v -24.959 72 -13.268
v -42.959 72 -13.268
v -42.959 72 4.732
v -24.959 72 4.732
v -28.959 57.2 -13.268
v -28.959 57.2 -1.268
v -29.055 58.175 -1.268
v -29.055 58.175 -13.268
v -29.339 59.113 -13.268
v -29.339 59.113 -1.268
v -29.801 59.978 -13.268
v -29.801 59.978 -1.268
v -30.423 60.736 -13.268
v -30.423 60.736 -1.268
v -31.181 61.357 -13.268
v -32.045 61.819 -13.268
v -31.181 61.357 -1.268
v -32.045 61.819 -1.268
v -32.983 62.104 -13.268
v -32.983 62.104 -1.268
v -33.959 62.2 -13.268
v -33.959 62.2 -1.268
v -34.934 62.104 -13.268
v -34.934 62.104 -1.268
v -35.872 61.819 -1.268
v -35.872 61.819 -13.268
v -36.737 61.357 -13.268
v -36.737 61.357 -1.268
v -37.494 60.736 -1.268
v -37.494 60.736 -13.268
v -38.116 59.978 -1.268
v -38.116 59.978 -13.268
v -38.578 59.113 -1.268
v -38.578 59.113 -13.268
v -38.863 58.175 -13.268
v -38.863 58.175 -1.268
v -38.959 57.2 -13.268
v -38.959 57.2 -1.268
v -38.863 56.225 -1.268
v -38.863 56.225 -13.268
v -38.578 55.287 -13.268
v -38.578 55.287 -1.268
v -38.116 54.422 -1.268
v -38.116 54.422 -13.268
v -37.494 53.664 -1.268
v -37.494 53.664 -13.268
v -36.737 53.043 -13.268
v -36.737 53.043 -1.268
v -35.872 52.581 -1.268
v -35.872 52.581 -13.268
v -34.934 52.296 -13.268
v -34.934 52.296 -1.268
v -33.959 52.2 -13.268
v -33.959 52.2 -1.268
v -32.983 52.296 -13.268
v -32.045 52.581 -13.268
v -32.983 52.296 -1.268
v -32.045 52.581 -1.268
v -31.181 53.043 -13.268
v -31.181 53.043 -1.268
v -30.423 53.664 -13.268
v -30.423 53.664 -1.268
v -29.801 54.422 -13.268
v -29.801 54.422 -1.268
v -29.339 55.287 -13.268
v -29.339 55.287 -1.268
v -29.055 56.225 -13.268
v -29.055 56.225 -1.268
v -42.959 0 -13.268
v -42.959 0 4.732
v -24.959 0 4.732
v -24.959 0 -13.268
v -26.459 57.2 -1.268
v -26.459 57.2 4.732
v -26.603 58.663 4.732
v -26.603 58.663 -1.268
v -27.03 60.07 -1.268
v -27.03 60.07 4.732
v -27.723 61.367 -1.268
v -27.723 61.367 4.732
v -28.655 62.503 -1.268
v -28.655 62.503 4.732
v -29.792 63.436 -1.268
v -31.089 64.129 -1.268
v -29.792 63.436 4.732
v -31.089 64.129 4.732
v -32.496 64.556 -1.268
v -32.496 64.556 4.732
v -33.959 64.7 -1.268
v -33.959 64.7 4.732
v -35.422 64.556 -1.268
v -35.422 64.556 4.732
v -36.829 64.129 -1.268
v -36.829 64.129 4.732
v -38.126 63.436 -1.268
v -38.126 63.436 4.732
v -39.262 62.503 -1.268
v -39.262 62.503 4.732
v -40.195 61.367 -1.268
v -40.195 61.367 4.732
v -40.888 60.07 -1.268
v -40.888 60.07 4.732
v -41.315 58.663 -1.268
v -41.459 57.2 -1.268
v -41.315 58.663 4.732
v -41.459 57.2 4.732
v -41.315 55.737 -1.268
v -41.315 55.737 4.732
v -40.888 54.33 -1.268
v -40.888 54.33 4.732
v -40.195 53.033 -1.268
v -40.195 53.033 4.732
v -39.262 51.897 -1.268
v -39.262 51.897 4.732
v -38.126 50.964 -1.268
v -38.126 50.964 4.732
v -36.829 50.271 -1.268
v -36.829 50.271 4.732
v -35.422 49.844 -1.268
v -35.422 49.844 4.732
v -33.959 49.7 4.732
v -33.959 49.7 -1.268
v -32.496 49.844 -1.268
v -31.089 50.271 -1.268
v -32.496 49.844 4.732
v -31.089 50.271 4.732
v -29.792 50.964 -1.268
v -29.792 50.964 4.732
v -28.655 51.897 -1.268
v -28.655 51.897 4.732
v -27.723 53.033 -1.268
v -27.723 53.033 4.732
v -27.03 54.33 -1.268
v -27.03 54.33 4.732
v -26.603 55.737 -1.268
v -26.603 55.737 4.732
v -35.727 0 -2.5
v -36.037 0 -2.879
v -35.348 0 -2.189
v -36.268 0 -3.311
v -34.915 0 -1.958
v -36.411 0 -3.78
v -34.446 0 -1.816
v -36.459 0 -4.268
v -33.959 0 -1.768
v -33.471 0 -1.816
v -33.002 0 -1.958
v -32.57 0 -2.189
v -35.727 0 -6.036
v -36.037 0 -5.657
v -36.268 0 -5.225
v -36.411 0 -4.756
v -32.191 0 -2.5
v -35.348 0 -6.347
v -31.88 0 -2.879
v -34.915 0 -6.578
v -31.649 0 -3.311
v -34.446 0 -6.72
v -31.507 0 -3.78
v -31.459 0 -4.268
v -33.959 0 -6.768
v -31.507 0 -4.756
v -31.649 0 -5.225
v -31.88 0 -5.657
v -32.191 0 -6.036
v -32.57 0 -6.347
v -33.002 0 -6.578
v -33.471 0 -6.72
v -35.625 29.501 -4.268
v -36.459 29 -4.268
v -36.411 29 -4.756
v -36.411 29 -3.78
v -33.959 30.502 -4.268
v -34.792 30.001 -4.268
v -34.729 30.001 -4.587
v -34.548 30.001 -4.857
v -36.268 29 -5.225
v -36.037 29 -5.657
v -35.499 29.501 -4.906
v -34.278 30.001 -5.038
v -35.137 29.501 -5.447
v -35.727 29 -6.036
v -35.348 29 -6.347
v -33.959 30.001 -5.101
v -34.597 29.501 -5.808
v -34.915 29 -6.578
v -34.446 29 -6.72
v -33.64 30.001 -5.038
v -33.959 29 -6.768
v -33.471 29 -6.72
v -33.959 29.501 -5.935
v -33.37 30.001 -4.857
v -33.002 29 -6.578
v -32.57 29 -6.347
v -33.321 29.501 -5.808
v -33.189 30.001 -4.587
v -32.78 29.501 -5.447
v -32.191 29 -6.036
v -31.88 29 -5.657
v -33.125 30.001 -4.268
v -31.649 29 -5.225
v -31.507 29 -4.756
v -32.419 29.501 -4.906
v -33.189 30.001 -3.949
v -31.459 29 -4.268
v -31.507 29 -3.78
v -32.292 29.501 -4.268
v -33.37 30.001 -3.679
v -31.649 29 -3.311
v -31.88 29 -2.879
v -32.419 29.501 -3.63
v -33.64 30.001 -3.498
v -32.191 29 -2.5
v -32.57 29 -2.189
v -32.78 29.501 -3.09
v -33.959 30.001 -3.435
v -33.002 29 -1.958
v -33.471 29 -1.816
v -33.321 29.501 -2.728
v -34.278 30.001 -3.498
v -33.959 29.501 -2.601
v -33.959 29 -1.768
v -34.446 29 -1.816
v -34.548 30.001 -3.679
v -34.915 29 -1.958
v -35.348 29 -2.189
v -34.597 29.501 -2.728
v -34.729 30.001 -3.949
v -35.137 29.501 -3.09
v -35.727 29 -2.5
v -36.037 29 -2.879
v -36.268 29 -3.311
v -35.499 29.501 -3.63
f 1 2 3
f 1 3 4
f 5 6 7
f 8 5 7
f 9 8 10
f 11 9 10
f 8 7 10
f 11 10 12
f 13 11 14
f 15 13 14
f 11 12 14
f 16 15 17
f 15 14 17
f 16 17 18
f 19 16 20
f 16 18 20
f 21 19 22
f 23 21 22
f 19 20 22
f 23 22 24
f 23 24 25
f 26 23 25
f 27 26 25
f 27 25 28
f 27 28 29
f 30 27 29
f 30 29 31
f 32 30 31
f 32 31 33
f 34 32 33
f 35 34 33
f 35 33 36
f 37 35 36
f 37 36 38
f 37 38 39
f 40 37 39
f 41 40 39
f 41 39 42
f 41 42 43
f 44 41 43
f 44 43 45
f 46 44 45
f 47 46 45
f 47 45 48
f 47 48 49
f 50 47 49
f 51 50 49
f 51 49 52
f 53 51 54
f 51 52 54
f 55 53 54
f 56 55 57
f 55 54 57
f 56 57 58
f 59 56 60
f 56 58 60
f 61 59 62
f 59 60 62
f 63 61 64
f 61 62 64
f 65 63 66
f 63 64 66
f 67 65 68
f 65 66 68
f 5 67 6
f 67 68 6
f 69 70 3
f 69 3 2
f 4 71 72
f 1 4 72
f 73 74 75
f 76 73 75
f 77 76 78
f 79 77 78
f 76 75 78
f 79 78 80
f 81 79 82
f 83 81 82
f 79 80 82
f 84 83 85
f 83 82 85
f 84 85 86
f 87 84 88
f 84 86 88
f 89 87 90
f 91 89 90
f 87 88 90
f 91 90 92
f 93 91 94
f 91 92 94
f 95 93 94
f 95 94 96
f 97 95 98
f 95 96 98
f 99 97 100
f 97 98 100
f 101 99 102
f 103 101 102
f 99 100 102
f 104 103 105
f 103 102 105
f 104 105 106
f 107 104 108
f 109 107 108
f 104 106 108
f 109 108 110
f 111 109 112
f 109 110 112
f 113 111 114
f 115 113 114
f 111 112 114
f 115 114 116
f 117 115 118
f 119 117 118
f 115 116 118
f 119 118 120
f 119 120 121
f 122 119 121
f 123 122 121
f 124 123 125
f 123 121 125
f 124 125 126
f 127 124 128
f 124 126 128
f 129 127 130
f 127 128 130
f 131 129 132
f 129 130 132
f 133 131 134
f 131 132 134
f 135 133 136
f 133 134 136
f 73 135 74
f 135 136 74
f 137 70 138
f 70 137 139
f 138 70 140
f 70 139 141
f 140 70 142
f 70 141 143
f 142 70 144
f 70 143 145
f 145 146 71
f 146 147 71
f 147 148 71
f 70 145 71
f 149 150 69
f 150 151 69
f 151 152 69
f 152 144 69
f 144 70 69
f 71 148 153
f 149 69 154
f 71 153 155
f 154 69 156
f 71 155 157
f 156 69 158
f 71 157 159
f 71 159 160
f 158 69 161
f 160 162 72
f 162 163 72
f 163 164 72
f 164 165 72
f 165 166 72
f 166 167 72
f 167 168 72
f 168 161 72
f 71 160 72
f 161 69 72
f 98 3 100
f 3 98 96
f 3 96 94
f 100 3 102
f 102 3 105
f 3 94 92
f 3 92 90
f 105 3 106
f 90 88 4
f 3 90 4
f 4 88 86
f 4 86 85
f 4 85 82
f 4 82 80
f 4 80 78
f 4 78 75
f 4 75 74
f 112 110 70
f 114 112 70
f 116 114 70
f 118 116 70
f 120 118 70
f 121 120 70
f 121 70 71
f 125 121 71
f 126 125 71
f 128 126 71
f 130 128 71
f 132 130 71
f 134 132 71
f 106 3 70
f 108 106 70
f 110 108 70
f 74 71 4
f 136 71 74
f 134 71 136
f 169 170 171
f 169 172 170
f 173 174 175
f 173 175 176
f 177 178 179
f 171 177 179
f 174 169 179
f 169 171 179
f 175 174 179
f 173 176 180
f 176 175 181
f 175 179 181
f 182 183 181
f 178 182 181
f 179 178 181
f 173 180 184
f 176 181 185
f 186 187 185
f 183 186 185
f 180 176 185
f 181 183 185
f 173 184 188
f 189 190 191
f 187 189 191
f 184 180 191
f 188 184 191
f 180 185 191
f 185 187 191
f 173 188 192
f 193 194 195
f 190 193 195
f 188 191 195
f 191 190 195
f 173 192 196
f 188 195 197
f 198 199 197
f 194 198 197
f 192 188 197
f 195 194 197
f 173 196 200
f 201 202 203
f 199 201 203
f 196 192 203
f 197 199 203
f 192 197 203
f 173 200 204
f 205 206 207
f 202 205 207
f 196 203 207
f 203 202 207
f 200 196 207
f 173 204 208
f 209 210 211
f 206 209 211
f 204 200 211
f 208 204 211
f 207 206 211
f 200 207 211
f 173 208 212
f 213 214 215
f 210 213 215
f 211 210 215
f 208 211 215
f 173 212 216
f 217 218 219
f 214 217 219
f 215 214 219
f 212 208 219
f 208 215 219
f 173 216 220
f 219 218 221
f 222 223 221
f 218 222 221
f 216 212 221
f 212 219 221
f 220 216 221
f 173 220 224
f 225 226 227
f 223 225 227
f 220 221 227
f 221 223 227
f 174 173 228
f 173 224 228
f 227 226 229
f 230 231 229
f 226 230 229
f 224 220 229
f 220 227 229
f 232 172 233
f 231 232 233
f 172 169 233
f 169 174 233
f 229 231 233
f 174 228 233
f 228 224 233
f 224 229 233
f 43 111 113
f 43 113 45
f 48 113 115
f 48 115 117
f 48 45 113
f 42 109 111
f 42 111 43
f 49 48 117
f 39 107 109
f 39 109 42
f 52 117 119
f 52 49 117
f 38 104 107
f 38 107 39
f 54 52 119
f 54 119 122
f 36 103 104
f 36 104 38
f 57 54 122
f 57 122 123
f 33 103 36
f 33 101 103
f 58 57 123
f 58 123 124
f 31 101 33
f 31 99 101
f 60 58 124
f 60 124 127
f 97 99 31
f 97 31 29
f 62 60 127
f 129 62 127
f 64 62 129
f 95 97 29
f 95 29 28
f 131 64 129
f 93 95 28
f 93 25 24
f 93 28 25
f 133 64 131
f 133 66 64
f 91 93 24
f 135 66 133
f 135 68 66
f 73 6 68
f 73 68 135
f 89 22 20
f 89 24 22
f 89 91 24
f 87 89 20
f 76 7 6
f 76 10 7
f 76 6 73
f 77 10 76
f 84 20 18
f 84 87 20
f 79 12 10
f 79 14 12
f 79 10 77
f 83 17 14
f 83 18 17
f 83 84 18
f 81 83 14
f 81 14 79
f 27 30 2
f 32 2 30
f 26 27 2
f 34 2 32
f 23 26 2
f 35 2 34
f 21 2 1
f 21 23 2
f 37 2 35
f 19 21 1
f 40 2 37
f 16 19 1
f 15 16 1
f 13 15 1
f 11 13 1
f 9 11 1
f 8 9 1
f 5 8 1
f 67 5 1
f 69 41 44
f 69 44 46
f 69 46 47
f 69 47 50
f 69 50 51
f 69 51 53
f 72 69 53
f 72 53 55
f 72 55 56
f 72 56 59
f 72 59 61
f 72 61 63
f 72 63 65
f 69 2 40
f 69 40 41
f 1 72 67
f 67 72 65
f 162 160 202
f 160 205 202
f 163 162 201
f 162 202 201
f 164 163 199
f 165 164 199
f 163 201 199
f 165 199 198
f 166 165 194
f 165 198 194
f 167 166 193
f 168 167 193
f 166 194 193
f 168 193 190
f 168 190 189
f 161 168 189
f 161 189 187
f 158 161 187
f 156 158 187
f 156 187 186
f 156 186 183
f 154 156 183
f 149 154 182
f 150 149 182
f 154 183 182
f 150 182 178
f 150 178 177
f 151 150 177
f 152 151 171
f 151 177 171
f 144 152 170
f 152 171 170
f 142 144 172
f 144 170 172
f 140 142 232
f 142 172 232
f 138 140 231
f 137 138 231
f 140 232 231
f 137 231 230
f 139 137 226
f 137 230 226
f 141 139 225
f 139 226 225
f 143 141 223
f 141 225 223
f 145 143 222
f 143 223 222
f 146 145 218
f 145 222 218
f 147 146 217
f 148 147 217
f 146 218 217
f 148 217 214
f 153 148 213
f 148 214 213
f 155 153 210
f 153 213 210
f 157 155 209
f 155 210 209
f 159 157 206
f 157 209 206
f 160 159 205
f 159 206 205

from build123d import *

# Parameters (mm, degrees)
SKETCH1_W                 = 18
SKETCH1_H                 = 18
BOSS_EXTRUDE1_DEPTH       = 72
SKETCH2_R                 = 5
CUT_EXTRUDE1_DEPTH        = 19
M6X1_0_TAPPED_HOLE1_D     = 5
M6X1_0_TAPPED_HOLE1_DEPTH = 29
M6X1_0_TAPPED_HOLE1_TIP   = 1.502151548
SKETCH6_R                 = 7.5
CUT_EXTRUDE2_DEPTH        = 6


with BuildPart() as part:
    # Sketch1 → Boss-Extrude1 (new body)
    with BuildSketch(Plane(origin=(0, 0, 0), x_dir=(1, 0, 0), z_dir=(0, 1, 0))):
        with Locations((-33.958762887, 4.268041237)):
            Rectangle(SKETCH1_W, SKETCH1_H)
    extrude(amount=BOSS_EXTRUDE1_DEPTH)

    # Sketch2 → Cut-Extrude1 (cut, through all)
    with BuildSketch(Plane.XY.offset(4.731958763)):
        with Locations((-33.958762887, 57.2)):
            Circle(SKETCH2_R)
    extrude(amount=-CUT_EXTRUDE1_DEPTH, mode=Mode.SUBTRACT)

    # M6x1.0 Tapped Hole1
    with Locations(Plane(origin=(0, 0, 0), x_dir=(-1, 0, 0), z_dir=(0, -1, 0))):
        with Locations((33.958762887, 4.268041237)):
            Hole(M6X1_0_TAPPED_HOLE1_D / 2, depth=M6X1_0_TAPPED_HOLE1_DEPTH)
            with Locations((0, 0, -(M6X1_0_TAPPED_HOLE1_DEPTH + M6X1_0_TAPPED_HOLE1_TIP / 2))):  # 118° drill point
                Cone(0, M6X1_0_TAPPED_HOLE1_D / 2, M6X1_0_TAPPED_HOLE1_TIP, mode=Mode.SUBTRACT)

    # Sketch6 → Cut-Extrude2 (cut)
    with BuildSketch(Plane.XY.offset(4.731958763)):
        with Locations((-33.958762887, 57.2)):
            Circle(SKETCH6_R)
    extrude(amount=-CUT_EXTRUDE2_DEPTH, mode=Mode.SUBTRACT)


solid = part.part
